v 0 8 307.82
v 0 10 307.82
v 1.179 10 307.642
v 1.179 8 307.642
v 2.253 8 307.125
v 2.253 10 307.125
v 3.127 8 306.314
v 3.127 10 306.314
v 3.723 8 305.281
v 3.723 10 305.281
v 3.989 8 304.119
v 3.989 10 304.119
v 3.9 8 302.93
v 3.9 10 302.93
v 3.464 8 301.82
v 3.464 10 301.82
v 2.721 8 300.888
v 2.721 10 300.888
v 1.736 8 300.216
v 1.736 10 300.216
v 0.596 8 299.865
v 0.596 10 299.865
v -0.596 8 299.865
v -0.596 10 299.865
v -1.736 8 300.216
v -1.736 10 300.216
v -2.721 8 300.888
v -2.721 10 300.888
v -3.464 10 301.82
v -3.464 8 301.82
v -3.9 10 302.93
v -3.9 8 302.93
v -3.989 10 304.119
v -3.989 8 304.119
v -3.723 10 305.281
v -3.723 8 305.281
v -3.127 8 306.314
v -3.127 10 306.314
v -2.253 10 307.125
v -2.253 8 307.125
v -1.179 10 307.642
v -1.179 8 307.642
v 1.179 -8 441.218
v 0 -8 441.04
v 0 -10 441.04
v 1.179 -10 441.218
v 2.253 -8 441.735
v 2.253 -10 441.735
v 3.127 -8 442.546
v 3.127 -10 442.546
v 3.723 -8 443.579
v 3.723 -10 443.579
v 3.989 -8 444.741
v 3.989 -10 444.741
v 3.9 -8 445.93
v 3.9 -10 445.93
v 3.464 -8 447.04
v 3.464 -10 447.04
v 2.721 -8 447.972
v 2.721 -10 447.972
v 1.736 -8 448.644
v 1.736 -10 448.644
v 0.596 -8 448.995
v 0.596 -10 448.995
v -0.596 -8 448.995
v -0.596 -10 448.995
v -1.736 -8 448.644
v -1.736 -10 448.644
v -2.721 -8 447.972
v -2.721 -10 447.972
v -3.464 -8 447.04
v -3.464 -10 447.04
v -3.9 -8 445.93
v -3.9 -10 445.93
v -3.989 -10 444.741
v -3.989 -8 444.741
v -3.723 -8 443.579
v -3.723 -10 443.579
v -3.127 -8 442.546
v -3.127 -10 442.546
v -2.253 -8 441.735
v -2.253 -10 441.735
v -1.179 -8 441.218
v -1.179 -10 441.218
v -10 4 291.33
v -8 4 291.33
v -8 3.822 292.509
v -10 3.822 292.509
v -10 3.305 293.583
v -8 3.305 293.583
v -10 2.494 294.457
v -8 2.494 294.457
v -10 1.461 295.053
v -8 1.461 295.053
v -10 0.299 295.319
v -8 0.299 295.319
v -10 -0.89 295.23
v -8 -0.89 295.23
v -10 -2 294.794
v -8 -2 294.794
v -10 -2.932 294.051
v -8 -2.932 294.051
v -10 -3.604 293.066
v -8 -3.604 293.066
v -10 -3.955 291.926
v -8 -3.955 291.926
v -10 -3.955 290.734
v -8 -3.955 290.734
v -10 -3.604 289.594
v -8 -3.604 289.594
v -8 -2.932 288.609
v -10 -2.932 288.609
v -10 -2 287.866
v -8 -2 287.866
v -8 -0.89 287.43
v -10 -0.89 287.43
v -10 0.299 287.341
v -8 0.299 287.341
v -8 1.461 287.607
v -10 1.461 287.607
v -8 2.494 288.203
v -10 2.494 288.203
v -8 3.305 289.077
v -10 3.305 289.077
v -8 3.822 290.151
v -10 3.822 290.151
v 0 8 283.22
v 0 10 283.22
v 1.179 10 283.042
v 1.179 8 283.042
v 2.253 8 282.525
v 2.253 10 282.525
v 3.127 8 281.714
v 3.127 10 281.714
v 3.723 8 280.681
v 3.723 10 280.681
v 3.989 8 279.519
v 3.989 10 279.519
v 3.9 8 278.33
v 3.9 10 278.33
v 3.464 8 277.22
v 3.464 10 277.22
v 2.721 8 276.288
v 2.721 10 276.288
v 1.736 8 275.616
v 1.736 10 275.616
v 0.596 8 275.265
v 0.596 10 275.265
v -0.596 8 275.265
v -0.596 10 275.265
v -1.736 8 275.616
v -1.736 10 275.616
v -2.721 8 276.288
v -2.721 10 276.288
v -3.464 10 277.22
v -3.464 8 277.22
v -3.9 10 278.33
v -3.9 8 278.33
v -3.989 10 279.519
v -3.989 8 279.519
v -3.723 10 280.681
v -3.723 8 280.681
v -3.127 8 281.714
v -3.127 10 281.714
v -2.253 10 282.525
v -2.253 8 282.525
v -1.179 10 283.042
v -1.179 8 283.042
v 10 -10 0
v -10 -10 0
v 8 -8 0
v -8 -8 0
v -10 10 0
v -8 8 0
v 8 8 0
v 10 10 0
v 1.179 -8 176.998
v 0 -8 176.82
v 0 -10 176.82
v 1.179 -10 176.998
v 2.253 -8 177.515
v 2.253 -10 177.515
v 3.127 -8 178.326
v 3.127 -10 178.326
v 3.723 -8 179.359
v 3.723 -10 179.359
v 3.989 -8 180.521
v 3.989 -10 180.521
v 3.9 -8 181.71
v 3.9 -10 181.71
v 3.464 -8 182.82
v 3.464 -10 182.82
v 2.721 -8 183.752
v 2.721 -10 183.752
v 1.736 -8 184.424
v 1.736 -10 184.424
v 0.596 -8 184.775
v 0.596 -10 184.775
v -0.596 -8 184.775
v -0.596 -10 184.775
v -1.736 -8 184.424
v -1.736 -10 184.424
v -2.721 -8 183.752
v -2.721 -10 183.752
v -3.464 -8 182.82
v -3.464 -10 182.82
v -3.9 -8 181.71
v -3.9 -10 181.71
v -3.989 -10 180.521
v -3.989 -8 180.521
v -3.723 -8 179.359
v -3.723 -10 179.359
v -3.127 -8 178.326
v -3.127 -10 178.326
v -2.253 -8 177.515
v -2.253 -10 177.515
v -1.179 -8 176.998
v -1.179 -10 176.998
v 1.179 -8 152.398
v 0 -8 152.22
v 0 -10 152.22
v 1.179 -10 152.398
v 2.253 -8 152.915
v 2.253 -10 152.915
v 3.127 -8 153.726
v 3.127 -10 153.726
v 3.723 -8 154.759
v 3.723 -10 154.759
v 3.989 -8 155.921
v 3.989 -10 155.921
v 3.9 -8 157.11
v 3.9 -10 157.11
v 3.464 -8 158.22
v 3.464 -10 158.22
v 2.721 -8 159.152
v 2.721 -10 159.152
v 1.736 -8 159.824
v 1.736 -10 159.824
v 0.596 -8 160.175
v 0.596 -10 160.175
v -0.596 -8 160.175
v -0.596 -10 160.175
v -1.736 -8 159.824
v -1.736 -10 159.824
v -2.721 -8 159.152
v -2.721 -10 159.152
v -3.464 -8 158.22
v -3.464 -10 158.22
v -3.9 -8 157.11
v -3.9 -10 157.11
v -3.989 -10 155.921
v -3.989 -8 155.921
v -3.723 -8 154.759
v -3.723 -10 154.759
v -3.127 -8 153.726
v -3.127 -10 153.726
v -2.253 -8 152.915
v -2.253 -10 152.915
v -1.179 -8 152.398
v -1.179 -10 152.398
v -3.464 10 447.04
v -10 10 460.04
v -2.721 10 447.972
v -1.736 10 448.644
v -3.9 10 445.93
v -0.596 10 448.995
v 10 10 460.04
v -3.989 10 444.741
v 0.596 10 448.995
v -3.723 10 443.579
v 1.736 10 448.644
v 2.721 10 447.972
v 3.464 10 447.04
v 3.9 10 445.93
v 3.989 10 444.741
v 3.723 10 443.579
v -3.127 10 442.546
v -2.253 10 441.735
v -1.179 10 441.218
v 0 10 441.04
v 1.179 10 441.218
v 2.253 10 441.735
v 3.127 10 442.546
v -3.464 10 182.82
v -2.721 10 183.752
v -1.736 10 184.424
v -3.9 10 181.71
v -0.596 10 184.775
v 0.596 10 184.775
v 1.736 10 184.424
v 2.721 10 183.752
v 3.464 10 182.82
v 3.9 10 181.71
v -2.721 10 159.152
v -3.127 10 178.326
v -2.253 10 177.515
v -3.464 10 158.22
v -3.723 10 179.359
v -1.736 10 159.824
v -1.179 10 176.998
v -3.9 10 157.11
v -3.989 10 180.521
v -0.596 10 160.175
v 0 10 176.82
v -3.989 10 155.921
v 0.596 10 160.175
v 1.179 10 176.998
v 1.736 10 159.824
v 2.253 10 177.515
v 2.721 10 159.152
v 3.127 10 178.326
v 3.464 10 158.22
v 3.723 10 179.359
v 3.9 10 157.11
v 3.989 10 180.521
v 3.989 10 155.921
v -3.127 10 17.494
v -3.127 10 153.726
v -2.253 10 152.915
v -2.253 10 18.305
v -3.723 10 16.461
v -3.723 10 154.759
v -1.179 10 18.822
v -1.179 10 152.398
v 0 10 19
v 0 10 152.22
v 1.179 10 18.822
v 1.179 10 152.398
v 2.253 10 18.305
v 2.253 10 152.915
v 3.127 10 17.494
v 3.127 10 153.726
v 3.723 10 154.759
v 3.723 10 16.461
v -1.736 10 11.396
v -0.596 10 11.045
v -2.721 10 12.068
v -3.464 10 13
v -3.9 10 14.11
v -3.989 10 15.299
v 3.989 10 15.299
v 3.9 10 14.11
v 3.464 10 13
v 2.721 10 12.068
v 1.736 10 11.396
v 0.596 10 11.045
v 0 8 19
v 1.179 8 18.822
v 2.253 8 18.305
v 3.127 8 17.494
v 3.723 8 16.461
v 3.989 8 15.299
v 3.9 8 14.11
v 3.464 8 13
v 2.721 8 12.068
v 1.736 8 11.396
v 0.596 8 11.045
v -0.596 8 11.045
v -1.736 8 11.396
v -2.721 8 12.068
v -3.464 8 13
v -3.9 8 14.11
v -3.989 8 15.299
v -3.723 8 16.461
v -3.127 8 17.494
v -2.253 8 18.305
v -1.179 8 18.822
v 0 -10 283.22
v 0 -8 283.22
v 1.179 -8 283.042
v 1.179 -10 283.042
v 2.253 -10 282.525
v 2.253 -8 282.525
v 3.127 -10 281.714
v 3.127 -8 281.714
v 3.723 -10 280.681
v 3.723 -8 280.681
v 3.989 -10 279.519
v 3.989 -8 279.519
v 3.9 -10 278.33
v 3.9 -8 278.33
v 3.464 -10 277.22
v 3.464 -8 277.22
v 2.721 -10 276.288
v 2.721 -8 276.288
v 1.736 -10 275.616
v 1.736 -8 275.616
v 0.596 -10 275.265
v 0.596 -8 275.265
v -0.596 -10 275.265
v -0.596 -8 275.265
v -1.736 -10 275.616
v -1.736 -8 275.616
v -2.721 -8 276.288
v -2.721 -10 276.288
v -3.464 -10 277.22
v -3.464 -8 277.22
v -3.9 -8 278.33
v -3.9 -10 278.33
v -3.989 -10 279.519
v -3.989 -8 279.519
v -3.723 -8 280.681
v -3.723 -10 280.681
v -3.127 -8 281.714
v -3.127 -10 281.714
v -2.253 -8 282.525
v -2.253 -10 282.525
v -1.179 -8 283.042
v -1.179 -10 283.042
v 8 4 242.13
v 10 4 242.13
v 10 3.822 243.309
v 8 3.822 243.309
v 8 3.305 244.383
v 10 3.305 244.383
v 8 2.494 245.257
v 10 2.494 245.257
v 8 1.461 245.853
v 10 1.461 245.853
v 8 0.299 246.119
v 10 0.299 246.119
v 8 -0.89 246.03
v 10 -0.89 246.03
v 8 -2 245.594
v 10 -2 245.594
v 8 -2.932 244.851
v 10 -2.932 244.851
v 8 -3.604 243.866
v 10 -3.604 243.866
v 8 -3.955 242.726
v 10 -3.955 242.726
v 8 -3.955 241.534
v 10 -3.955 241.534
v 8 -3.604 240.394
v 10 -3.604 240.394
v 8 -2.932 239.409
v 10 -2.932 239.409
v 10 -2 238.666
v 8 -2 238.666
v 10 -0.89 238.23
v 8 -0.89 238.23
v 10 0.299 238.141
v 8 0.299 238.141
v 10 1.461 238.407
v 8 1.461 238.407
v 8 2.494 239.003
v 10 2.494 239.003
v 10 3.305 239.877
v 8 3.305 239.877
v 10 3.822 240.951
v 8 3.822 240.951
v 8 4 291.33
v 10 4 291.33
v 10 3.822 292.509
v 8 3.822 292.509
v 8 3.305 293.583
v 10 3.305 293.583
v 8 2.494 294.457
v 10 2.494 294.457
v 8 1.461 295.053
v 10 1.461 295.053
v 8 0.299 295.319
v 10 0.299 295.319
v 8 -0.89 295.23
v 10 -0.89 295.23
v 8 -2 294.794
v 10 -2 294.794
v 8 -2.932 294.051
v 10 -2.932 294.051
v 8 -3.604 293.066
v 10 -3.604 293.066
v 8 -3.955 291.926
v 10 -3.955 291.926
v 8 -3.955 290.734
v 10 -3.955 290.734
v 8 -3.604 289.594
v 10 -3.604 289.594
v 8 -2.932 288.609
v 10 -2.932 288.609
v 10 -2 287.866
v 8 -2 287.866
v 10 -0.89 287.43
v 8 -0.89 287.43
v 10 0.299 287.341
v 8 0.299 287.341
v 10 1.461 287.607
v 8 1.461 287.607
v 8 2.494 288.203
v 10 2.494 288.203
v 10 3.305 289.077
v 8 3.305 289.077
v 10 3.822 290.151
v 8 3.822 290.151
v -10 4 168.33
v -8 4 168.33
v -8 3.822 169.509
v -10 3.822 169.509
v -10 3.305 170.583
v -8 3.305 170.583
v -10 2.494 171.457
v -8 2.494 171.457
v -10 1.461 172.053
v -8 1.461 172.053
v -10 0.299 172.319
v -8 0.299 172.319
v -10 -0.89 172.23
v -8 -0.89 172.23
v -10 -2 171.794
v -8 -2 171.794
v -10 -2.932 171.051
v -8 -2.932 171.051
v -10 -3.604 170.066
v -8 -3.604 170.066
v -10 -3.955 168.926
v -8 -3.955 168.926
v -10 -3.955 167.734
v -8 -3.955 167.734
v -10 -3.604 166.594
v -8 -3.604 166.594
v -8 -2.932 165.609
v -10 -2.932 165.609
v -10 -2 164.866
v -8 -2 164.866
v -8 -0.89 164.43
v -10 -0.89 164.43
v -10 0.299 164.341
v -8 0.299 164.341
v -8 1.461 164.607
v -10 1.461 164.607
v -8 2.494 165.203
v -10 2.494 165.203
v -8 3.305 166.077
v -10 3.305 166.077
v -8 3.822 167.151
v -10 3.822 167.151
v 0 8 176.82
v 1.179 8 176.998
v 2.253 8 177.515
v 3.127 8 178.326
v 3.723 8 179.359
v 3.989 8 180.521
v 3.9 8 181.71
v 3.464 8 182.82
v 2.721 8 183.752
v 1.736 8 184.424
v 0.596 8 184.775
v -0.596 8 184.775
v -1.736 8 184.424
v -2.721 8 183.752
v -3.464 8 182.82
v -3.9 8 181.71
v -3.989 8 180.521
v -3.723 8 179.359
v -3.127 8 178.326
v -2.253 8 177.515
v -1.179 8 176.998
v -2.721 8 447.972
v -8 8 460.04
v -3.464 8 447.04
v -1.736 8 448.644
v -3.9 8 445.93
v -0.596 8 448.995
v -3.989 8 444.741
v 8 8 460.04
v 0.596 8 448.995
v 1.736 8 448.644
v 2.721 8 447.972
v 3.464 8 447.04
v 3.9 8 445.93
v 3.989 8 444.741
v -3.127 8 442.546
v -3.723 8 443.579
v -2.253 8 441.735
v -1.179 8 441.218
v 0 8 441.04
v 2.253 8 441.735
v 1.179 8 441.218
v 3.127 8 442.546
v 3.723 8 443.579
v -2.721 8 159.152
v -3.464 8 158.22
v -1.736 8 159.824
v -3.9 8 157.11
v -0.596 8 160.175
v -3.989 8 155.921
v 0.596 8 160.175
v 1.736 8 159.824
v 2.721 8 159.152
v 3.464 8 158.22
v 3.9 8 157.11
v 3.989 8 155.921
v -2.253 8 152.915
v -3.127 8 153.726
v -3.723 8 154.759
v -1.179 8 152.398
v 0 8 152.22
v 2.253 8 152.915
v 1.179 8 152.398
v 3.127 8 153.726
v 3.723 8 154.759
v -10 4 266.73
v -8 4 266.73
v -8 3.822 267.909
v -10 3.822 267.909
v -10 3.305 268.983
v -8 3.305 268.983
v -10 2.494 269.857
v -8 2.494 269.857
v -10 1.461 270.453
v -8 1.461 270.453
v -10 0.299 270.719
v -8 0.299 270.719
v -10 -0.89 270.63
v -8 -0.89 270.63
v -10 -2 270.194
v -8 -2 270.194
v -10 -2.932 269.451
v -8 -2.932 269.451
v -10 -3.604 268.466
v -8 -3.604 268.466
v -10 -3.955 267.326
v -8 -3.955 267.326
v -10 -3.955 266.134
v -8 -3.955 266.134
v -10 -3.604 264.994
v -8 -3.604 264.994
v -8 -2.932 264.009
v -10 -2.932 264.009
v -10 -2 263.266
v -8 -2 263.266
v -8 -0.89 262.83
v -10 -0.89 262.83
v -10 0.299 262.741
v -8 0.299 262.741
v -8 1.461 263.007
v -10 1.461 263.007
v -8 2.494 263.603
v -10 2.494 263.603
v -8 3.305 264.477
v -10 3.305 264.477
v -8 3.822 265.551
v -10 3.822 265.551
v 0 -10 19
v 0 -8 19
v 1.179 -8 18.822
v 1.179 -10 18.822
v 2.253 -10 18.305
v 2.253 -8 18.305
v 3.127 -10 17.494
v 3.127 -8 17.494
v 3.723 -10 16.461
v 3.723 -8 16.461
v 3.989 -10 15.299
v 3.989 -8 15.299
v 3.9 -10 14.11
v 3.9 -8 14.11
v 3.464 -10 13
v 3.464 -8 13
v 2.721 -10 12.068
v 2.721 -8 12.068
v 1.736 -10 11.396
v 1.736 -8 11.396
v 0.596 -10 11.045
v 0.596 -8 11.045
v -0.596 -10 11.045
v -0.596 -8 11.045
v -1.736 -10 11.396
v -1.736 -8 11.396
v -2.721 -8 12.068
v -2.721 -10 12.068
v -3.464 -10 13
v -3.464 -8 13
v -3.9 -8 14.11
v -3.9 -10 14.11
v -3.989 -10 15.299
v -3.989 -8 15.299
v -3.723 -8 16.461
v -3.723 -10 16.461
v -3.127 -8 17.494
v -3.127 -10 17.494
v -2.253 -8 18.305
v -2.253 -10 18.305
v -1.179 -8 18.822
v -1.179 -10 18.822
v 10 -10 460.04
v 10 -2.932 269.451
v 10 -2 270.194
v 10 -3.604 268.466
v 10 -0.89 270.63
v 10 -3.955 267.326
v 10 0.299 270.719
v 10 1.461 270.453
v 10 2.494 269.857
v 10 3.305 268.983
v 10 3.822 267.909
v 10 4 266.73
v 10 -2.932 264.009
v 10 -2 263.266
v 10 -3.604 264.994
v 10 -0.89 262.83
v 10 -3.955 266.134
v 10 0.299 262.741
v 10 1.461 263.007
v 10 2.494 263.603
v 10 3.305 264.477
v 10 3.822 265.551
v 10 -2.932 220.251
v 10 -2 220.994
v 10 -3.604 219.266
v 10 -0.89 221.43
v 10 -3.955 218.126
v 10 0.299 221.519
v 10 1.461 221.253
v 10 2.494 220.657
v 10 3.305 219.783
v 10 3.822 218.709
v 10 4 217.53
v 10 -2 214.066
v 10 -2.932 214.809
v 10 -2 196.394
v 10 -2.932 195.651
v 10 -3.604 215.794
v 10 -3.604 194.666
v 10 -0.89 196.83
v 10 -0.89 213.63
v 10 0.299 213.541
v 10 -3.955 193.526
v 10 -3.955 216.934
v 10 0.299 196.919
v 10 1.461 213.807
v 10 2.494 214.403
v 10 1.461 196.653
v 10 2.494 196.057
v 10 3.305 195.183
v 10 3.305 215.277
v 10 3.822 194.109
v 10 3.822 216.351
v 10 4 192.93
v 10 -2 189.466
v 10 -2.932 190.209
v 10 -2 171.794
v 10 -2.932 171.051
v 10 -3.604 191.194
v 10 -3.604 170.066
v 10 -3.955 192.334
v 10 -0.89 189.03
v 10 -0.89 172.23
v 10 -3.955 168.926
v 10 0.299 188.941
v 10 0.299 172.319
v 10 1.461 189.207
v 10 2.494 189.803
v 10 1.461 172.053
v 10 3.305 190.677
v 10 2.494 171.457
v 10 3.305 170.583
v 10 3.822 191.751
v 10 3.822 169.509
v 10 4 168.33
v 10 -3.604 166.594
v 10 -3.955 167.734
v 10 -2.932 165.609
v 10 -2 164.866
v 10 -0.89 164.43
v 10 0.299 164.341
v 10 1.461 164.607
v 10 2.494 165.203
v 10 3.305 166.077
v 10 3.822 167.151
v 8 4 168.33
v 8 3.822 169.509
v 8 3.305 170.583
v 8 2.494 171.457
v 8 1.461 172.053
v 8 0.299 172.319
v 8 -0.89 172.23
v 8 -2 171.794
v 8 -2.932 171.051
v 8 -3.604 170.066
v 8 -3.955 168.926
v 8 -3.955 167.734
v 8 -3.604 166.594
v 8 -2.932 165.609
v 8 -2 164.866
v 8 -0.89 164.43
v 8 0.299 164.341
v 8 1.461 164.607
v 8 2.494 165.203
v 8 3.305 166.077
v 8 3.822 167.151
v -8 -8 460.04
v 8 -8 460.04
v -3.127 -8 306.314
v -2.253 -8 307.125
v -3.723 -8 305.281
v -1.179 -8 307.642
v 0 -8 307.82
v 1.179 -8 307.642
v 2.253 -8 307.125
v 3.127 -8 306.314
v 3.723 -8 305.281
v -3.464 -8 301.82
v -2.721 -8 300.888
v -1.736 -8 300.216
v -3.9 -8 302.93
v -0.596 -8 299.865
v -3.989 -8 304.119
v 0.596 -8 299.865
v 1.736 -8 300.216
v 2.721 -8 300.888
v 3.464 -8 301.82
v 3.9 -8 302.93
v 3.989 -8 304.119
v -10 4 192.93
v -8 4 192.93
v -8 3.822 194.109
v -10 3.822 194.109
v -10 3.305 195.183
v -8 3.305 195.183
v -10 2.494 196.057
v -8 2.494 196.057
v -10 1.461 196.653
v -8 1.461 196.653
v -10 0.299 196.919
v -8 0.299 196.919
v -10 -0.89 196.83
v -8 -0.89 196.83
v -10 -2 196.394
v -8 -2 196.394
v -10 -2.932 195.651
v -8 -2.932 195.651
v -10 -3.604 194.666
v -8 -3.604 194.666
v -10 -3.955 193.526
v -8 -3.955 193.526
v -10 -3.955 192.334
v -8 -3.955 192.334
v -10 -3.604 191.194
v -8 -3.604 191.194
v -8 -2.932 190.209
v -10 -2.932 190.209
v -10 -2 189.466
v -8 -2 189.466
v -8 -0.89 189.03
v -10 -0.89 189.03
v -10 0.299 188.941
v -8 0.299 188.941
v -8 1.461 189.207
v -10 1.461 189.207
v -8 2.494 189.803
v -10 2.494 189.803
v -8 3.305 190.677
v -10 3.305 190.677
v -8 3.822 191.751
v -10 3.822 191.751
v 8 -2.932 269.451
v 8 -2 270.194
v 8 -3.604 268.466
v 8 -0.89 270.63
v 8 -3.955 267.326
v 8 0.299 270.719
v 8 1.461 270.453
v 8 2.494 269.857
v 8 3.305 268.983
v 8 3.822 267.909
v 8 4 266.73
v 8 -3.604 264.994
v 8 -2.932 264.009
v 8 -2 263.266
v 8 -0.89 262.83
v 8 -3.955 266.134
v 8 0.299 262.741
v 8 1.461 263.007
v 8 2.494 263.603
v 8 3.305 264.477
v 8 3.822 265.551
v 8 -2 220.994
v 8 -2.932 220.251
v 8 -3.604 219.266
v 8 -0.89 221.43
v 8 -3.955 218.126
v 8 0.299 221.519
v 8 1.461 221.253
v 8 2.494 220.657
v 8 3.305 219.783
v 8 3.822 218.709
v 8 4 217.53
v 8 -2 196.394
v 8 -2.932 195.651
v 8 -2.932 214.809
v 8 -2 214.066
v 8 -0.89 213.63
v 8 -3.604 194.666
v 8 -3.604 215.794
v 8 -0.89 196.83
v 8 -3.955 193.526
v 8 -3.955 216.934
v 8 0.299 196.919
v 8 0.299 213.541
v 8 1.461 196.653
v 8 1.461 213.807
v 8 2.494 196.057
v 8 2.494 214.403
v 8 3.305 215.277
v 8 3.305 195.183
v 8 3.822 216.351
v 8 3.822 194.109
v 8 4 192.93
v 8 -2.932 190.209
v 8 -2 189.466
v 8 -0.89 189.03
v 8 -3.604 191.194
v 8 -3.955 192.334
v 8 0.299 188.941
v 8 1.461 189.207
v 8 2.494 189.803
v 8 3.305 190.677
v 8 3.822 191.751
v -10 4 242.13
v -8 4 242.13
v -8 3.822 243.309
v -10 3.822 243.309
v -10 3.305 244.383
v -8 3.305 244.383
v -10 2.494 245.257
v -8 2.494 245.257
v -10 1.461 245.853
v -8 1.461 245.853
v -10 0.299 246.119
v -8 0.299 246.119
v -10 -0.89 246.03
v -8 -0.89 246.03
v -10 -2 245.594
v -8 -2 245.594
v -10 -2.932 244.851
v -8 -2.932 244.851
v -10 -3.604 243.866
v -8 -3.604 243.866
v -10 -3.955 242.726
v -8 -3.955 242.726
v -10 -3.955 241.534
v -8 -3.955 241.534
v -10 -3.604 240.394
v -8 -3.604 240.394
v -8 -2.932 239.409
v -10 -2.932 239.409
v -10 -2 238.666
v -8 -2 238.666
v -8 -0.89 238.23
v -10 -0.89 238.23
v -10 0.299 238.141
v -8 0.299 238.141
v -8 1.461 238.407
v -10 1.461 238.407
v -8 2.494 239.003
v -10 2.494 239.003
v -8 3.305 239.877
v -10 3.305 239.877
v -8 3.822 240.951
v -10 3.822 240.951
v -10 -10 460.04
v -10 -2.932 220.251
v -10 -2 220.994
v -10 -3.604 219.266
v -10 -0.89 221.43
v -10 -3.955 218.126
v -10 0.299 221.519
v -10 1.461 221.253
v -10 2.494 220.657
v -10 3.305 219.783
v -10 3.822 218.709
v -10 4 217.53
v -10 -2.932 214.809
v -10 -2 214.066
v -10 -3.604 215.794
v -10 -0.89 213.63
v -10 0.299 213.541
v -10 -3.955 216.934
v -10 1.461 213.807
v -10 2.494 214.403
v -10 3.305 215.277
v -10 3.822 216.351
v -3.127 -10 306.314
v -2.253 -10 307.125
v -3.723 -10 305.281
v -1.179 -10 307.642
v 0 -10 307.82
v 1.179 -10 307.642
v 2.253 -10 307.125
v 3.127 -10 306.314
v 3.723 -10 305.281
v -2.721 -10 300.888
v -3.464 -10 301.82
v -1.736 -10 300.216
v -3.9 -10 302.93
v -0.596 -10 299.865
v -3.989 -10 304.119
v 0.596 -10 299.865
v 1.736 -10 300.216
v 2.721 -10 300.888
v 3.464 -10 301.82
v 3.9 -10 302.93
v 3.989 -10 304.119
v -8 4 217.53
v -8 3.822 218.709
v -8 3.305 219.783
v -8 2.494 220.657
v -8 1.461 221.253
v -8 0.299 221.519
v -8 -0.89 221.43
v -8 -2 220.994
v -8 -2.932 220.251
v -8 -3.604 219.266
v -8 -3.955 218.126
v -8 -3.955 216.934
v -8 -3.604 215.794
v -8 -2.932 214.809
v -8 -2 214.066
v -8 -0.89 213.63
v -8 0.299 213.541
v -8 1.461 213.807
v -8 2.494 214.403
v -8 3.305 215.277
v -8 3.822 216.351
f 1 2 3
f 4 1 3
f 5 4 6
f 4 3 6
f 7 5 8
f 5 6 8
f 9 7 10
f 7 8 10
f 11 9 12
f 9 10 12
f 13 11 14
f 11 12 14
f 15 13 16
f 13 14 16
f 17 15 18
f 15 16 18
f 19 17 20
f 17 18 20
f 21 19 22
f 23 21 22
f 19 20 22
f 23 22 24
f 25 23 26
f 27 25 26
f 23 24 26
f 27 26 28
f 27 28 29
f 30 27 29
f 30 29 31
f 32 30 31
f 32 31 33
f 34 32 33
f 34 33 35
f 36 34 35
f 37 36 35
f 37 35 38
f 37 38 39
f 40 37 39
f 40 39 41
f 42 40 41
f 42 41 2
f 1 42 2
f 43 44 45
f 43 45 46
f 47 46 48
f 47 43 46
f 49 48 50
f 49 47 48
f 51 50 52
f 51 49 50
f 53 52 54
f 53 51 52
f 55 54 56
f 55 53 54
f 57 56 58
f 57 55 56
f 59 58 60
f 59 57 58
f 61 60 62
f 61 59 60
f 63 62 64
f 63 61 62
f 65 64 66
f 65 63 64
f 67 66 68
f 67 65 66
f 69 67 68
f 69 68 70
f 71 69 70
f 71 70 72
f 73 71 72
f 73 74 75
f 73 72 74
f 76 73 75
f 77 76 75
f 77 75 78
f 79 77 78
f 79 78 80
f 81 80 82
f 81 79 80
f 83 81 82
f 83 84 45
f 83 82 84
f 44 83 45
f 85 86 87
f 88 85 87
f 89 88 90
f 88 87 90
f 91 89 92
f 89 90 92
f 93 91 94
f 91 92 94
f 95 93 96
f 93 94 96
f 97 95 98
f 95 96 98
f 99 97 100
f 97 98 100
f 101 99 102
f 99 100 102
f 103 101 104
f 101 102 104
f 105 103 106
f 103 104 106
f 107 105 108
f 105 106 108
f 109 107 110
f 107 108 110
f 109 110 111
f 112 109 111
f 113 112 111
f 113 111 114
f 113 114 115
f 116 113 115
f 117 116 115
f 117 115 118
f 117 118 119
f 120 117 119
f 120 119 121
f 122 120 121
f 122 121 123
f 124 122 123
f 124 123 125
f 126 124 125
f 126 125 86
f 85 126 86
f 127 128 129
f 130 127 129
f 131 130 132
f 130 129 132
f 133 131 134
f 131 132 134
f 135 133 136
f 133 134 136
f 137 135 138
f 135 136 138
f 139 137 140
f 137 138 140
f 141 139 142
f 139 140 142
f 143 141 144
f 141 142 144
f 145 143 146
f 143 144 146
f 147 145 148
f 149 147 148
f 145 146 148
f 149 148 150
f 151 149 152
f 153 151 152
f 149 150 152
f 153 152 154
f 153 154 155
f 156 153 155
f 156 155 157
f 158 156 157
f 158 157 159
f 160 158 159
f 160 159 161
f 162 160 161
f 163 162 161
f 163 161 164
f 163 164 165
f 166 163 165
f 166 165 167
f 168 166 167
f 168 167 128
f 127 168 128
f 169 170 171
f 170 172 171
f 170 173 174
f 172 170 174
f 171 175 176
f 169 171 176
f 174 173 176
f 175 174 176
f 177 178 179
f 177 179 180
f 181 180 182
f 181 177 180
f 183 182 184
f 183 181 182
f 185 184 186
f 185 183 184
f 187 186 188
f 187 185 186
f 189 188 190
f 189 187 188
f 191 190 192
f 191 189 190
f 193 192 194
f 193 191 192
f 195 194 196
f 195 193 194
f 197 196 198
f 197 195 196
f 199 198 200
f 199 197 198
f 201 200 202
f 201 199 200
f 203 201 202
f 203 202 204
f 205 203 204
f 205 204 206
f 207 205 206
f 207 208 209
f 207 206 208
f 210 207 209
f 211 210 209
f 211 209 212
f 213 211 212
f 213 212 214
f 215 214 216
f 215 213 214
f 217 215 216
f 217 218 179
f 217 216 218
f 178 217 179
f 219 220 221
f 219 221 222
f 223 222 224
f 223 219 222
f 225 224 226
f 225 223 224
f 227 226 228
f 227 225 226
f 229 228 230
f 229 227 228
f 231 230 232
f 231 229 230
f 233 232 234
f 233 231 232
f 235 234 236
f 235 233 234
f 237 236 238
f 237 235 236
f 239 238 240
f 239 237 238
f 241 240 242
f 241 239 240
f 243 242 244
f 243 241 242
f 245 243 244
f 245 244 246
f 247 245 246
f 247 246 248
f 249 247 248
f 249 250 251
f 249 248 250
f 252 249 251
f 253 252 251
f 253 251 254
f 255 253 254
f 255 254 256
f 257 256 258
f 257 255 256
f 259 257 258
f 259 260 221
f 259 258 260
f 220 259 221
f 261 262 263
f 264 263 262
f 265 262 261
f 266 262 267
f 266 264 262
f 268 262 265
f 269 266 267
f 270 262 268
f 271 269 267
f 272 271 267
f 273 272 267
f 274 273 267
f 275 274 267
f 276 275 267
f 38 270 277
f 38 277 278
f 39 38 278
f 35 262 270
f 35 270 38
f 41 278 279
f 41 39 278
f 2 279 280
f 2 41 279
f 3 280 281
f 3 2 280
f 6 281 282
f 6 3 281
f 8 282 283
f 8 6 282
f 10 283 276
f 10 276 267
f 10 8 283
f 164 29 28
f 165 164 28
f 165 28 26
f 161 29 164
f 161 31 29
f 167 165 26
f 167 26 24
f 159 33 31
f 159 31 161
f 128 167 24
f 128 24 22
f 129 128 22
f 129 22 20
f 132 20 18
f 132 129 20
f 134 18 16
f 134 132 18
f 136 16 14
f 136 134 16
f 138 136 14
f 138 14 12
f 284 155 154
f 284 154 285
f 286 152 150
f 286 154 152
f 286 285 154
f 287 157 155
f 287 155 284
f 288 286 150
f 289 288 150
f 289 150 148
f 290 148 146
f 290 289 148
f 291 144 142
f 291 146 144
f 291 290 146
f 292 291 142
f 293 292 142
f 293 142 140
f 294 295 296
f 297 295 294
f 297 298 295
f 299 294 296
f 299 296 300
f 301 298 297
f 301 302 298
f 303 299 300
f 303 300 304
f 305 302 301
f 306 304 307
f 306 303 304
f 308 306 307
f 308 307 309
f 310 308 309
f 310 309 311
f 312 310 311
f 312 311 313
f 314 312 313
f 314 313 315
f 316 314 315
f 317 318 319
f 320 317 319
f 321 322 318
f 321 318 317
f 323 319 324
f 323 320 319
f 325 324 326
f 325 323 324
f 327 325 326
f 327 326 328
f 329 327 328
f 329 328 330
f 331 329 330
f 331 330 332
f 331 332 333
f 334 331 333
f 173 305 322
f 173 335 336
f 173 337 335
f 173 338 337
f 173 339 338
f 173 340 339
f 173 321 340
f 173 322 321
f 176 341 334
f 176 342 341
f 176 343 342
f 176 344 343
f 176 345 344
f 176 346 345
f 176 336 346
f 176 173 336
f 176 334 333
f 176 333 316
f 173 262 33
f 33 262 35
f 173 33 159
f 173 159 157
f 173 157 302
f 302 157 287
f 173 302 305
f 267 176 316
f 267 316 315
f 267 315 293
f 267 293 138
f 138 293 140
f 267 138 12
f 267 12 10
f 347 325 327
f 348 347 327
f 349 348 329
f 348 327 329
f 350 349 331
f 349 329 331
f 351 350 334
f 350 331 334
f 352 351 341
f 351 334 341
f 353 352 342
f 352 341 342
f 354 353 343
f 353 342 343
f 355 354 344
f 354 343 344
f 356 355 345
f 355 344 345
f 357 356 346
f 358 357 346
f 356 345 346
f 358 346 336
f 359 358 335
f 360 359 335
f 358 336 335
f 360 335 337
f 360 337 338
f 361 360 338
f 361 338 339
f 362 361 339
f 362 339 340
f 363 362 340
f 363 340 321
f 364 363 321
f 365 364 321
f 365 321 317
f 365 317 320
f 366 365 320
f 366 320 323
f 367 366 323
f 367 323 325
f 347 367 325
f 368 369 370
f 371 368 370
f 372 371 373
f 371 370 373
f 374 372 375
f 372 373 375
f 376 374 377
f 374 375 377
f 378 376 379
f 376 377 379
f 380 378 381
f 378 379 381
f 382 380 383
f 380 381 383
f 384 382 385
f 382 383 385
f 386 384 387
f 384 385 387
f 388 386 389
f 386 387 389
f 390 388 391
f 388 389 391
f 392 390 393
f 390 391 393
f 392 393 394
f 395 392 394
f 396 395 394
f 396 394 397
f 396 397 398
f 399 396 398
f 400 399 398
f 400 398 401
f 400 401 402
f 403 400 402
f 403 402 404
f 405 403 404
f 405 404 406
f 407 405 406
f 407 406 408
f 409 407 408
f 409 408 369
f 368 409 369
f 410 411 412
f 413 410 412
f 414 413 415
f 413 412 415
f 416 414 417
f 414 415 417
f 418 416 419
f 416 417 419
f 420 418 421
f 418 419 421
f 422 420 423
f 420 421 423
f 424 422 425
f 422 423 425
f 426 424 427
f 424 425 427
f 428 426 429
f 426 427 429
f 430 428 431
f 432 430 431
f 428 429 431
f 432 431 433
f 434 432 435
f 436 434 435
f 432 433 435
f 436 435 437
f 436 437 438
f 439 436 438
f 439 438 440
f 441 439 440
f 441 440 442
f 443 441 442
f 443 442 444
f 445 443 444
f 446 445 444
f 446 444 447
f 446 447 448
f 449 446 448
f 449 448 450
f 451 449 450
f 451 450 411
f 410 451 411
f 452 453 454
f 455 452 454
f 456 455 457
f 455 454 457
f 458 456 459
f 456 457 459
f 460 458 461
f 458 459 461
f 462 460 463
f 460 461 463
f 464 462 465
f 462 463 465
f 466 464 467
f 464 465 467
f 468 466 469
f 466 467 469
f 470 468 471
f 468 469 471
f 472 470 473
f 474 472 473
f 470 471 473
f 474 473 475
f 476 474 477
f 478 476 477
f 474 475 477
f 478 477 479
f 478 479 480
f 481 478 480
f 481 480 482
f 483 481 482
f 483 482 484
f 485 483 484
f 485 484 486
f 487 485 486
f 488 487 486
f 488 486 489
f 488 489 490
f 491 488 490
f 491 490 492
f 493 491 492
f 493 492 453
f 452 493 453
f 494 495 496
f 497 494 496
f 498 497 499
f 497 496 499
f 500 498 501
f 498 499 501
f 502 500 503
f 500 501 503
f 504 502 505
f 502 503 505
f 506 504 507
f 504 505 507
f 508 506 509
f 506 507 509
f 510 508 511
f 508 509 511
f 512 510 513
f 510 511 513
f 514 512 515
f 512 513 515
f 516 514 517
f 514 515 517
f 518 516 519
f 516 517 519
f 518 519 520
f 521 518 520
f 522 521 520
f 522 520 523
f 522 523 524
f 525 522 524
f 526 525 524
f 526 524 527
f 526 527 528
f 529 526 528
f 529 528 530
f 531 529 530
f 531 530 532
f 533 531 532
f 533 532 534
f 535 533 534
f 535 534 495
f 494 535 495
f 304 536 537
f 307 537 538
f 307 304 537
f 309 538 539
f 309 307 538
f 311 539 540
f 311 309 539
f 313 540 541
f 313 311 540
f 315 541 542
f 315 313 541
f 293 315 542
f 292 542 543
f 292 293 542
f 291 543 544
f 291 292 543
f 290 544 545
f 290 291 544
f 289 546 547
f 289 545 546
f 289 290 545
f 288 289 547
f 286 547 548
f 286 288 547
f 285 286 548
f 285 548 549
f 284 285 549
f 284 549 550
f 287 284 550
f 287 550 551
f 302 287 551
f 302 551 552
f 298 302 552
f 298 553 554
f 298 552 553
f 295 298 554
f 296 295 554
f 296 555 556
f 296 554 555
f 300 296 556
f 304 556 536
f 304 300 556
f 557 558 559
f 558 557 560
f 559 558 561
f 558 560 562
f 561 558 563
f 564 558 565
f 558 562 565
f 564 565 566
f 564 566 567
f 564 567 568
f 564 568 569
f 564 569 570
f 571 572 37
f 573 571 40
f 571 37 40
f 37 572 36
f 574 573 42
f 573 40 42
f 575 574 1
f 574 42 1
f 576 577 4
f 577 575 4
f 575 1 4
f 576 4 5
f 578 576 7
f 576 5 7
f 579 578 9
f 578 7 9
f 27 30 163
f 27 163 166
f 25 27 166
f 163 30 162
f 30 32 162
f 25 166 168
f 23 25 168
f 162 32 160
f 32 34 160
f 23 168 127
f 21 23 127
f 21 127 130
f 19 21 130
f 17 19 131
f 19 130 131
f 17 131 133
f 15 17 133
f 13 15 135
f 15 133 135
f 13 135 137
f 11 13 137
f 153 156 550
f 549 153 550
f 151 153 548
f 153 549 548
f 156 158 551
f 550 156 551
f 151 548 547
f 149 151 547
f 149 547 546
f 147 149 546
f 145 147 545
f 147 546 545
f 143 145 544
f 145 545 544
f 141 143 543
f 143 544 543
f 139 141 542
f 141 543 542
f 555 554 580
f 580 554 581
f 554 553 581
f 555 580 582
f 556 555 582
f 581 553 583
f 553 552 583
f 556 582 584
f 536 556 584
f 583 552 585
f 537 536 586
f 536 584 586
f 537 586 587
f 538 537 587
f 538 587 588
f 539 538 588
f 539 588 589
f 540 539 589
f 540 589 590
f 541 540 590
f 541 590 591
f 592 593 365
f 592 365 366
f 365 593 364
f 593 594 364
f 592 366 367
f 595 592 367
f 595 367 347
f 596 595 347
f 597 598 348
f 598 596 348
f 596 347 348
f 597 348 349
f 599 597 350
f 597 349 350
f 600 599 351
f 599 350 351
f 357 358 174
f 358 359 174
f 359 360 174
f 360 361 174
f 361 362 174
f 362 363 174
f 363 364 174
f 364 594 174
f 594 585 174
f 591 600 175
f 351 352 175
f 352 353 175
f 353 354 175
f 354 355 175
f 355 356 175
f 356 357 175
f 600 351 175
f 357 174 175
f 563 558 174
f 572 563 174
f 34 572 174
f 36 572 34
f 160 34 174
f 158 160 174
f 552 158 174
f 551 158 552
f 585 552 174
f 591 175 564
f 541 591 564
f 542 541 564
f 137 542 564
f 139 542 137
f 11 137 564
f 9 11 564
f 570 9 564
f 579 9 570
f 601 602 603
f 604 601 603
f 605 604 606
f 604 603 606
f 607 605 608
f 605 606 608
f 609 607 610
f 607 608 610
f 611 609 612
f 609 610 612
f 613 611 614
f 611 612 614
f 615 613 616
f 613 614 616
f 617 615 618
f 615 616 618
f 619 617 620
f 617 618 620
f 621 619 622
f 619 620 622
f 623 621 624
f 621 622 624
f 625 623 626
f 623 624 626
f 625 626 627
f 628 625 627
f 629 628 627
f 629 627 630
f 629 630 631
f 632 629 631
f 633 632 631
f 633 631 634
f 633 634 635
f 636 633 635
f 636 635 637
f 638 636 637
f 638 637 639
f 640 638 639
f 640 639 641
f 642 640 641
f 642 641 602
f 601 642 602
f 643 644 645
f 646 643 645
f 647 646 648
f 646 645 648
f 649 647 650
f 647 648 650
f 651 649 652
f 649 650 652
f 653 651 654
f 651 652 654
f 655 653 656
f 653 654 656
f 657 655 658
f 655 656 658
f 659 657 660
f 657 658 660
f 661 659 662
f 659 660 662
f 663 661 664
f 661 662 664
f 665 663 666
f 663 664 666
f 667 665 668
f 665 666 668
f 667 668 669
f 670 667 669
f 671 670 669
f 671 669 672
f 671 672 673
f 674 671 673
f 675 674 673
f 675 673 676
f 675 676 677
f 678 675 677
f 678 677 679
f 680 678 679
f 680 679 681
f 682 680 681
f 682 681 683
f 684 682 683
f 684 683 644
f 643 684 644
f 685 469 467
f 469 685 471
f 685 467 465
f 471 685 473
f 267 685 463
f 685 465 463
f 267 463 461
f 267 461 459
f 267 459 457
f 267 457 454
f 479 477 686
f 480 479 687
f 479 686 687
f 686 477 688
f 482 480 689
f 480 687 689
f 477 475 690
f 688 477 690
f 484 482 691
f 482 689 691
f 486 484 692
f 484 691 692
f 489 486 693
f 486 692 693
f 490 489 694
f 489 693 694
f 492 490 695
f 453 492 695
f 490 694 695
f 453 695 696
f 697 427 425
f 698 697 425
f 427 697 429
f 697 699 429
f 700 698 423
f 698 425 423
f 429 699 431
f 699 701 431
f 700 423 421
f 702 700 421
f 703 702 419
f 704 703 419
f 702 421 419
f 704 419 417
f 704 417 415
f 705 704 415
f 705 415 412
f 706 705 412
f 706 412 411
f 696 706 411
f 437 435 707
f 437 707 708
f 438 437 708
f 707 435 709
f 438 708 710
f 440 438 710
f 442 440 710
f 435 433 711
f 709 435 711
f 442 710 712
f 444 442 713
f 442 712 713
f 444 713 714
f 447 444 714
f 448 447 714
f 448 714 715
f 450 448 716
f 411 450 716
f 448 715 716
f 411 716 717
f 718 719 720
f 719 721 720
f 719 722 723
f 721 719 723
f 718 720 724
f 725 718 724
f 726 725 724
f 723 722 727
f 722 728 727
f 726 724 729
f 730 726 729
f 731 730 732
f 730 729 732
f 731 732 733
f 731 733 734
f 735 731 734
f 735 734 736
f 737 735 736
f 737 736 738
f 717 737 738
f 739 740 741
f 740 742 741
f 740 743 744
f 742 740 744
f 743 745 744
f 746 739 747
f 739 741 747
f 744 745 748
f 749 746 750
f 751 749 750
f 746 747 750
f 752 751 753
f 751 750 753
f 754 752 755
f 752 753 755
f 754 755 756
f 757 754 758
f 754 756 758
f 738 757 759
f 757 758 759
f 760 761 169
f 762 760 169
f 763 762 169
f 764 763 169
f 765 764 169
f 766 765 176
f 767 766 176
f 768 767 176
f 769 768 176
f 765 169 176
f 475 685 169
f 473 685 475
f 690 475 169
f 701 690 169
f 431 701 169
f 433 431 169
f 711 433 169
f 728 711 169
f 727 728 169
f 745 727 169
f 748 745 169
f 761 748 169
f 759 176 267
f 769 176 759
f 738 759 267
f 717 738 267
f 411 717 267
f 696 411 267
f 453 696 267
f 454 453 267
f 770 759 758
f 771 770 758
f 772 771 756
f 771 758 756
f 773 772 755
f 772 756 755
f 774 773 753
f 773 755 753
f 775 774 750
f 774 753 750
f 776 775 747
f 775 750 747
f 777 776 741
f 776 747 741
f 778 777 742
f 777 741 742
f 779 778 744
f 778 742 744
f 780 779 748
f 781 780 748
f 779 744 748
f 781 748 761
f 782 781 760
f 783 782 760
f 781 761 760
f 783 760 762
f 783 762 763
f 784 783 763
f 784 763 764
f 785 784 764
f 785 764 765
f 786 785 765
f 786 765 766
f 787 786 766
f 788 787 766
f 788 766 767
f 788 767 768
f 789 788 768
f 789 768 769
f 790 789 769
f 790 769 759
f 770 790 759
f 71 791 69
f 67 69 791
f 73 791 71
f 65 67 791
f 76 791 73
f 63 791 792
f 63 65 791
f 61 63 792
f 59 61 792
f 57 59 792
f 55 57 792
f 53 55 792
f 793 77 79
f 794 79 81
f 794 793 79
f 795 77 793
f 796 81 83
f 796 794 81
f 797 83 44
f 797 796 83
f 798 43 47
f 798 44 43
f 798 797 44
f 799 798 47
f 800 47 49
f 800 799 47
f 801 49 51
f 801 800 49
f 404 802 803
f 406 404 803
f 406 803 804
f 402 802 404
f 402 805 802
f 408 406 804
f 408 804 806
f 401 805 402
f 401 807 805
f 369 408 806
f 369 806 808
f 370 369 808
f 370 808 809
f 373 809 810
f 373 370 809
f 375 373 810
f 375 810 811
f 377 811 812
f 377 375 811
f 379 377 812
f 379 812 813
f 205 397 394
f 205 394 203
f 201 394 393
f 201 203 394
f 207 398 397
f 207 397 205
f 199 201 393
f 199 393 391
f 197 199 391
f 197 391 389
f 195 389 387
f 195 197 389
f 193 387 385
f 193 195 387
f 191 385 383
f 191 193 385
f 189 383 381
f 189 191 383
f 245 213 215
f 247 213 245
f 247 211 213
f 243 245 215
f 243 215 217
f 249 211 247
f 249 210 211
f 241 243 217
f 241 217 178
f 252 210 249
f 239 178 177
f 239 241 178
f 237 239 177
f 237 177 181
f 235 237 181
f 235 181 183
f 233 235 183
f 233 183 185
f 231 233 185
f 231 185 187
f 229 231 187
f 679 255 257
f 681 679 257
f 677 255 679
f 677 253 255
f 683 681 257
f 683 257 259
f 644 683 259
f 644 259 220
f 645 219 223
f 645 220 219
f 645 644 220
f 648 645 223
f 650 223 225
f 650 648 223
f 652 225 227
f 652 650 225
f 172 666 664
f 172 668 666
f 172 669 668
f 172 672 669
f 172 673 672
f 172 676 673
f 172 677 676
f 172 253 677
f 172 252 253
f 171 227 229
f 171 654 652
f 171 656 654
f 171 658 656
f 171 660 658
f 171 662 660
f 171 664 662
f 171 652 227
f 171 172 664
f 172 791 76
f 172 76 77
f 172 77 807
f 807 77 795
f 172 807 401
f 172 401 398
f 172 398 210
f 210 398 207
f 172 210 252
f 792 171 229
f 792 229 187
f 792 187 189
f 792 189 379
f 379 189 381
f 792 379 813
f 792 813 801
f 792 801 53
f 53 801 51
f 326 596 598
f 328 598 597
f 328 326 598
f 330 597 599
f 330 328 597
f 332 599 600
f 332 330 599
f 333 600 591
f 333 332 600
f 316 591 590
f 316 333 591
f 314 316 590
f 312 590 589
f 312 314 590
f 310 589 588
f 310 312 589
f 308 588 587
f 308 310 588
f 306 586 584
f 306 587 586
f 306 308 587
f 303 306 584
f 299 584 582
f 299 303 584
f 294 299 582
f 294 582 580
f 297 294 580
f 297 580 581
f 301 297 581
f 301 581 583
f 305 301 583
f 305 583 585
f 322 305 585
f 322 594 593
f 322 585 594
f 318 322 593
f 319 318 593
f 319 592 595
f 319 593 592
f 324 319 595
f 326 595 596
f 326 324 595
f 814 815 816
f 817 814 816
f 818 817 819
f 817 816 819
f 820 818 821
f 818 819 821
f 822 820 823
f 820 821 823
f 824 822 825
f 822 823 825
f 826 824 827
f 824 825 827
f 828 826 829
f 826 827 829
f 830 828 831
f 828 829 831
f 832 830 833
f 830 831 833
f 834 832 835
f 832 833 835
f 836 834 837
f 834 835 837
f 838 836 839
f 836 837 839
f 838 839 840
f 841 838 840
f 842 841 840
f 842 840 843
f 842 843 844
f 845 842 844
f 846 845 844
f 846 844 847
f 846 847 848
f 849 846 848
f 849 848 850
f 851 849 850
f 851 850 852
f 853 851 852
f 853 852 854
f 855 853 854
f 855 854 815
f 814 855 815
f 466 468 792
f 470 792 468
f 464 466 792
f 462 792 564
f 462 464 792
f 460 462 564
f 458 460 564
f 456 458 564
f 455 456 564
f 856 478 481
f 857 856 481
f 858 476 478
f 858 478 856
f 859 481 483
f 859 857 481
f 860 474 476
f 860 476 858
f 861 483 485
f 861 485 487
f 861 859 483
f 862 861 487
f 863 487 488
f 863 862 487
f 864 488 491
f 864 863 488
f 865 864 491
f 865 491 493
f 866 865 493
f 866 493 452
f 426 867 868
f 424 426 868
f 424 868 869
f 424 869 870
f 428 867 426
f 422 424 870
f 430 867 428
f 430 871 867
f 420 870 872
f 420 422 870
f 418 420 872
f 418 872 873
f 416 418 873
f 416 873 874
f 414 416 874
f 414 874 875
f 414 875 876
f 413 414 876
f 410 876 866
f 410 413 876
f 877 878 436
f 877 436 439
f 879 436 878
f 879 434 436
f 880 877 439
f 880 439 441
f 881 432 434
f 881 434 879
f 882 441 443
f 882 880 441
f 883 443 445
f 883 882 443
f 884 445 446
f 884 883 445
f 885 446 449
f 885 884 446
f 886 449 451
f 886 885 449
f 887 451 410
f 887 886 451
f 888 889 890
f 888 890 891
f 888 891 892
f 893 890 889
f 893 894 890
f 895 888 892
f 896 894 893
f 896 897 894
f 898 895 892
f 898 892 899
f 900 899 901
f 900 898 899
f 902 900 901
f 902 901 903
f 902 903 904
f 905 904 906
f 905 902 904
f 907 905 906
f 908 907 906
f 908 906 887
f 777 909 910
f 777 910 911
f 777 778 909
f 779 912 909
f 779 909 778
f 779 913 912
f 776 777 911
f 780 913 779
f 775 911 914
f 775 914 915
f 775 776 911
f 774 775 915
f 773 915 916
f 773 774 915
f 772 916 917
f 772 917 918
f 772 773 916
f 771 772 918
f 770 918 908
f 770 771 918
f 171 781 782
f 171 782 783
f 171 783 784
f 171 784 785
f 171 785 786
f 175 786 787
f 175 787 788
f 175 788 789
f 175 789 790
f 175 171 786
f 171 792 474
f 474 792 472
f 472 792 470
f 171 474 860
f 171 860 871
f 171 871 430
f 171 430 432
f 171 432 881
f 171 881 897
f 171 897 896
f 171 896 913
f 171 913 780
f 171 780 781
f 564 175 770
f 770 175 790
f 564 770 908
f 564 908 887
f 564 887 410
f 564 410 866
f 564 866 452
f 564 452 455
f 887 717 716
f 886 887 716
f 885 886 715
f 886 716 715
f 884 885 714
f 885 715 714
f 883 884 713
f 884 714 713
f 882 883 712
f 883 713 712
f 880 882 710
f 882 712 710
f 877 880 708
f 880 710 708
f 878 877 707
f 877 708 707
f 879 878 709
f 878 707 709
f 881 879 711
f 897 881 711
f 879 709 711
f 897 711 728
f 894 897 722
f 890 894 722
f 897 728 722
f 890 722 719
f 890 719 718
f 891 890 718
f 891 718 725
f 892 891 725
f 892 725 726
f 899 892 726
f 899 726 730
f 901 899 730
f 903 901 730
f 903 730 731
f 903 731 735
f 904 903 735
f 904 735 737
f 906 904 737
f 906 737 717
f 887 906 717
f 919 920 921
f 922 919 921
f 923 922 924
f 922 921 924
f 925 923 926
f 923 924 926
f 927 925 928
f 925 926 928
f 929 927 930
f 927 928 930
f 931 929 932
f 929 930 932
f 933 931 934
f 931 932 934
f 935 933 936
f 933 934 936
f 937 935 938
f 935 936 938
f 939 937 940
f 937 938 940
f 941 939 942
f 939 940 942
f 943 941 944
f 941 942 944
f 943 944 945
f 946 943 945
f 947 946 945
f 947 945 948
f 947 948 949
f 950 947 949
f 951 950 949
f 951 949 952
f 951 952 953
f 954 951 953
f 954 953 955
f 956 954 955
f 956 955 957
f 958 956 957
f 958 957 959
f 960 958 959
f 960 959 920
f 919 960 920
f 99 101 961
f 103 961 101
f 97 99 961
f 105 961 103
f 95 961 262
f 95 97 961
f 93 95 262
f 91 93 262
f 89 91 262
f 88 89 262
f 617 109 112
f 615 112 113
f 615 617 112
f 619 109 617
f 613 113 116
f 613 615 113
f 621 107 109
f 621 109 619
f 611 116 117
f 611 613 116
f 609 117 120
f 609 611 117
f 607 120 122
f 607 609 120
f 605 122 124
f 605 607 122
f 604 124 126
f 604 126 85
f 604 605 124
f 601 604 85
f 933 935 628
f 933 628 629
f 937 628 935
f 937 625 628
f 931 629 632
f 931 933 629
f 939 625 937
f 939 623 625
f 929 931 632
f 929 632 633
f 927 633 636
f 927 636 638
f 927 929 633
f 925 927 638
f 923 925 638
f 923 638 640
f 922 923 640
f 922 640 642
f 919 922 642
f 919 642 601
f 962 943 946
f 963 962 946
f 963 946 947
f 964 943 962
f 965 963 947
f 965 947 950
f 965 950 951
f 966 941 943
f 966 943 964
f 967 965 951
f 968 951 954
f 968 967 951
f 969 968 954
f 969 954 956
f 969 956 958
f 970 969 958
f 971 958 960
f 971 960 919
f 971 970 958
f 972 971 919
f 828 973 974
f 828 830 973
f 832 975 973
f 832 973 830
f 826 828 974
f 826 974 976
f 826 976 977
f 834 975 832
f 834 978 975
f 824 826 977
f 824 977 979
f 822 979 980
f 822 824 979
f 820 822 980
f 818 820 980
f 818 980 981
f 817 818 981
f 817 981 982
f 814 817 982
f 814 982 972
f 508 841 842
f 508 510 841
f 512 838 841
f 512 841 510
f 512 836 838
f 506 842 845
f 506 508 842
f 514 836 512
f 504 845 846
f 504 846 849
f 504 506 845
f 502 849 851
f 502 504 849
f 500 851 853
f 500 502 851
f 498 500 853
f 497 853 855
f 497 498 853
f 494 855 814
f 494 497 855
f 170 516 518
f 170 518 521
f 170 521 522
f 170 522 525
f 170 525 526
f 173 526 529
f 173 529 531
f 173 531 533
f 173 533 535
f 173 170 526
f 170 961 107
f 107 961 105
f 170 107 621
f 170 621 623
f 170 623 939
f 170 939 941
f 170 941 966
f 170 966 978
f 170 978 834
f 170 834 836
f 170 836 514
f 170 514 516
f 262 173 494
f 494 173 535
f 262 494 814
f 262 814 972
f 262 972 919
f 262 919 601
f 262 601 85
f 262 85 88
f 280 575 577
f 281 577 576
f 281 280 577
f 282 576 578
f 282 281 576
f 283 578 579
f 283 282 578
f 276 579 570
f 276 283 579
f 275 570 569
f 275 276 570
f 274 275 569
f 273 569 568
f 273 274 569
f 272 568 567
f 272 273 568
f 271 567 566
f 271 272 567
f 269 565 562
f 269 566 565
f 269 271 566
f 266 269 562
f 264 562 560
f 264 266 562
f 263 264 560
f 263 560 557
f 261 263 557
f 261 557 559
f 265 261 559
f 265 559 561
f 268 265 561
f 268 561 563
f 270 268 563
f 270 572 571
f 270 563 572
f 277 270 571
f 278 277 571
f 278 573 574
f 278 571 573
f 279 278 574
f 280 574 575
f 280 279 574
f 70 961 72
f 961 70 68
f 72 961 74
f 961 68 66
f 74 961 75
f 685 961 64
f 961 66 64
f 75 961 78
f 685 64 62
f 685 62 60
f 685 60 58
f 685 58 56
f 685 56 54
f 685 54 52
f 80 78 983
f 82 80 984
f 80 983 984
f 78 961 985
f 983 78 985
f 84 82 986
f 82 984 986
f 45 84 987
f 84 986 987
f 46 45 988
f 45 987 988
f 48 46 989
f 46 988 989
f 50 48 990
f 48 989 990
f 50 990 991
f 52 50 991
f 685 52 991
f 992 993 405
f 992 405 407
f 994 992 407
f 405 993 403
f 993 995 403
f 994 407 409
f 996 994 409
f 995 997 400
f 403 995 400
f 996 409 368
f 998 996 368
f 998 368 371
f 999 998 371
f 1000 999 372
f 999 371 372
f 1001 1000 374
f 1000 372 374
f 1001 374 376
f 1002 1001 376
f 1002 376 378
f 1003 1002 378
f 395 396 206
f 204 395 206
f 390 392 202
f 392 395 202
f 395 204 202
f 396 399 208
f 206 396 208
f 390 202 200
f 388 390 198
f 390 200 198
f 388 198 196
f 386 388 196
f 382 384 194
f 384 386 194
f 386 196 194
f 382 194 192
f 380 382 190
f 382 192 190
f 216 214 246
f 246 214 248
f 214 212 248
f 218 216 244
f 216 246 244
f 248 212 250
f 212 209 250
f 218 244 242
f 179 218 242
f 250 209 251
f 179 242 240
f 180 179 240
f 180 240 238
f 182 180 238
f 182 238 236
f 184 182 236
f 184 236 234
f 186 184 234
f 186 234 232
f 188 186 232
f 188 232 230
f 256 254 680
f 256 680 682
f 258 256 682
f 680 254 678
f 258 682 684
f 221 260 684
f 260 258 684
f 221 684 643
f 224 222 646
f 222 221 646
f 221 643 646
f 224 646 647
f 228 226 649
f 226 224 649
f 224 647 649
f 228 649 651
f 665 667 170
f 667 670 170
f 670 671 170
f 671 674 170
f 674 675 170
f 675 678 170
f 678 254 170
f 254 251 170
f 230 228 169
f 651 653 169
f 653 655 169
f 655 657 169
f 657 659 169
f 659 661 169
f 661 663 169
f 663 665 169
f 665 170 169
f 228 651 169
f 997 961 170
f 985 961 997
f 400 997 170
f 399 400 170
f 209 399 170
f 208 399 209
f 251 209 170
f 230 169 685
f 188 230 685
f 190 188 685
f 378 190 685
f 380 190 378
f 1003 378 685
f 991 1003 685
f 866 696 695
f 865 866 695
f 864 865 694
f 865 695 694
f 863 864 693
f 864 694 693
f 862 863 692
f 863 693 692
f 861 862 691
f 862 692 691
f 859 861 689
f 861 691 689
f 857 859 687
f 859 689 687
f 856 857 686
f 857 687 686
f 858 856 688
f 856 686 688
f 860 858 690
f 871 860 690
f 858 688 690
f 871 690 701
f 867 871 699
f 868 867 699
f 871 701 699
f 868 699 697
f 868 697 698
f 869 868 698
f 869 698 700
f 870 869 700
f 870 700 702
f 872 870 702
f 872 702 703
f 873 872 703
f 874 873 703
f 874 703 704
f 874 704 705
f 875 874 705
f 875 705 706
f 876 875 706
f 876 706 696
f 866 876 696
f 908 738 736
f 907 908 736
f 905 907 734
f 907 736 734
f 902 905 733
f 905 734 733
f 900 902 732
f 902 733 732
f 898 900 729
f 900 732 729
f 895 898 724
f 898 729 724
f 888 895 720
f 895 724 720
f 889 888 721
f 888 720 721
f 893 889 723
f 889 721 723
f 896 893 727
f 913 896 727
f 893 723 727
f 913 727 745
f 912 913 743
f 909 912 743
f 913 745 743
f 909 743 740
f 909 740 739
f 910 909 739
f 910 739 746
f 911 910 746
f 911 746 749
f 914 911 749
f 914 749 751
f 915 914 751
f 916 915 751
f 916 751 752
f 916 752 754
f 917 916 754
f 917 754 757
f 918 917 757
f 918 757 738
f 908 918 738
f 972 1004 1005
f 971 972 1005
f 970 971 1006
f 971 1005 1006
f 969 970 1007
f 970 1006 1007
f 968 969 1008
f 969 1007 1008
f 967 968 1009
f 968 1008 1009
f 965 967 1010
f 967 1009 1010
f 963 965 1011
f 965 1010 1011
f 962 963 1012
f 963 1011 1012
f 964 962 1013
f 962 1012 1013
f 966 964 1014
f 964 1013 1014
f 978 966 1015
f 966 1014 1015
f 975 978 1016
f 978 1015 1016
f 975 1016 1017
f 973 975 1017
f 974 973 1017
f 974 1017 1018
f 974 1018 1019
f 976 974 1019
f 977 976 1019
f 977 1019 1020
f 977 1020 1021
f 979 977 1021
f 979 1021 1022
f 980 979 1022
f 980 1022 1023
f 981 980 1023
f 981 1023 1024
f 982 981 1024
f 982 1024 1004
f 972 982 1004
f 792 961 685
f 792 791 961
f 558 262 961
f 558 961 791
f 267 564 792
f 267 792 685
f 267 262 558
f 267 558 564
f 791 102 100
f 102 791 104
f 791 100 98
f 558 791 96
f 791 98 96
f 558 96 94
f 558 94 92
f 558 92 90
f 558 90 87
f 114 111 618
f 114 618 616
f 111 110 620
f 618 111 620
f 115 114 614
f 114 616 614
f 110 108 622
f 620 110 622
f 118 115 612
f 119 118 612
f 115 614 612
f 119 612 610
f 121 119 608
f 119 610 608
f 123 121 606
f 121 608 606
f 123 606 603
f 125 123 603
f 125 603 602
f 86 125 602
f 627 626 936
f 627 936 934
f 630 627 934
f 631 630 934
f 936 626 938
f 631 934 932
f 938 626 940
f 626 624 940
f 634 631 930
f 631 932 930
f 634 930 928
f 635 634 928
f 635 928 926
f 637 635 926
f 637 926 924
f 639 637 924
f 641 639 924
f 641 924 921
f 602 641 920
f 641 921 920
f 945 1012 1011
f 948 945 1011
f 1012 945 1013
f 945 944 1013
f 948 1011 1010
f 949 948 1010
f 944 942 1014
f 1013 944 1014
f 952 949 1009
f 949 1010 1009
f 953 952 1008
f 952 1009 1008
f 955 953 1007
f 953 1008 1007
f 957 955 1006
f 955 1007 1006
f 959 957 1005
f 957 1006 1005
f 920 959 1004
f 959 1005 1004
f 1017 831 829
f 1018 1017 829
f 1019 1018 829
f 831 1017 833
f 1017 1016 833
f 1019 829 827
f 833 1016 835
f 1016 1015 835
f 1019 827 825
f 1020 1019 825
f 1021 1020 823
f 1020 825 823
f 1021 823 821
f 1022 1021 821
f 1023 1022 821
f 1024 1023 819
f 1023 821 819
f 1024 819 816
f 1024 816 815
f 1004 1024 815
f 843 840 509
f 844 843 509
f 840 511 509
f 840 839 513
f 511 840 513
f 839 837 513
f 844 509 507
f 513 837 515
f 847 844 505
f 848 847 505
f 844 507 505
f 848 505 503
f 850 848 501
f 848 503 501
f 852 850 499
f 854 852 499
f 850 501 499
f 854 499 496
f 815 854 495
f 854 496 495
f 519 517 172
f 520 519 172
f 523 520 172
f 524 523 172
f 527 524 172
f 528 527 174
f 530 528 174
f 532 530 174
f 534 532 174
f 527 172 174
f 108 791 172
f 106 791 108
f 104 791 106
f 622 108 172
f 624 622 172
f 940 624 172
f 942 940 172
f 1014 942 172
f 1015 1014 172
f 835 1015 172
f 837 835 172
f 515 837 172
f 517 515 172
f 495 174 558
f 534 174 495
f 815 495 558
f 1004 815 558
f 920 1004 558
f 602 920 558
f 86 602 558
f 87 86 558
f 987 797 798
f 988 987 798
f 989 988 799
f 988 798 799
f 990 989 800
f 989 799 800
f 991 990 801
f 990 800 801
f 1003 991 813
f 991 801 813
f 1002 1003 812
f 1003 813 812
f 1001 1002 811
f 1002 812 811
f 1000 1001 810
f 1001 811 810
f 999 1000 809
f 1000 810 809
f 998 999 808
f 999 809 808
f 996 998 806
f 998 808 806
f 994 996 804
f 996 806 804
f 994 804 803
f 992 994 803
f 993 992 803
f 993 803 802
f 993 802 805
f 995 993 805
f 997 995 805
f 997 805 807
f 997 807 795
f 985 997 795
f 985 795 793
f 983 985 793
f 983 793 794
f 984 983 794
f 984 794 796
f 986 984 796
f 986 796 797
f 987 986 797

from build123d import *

# Parameters (mm, degrees)
SKETCH1_W           = 20
SKETCH1_H           = 20
SKETCH1_W_2         = 16
SKETCH1_H_2         = 16
BOSS_EXTRUDE1_DEPTH = 460.04
SKETCH2_R           = 4
CUT_EXTRUDE1_DEPTH  = 461.583110415
SKETCH5_R           = 4
CUT_EXTRUDE2_DEPTH  = 461.583110415
LPATTERN1_COUNT     = 6
LPATTERN1_PITCH     = 24.6
SKETCH6_R           = 4
CUT_EXTRUDE3_DEPTH  = 461.583110415


with BuildPart() as part:
    # Sketch1 → Boss-Extrude1 (new body)
    with BuildSketch(Plane.XY):
        Rectangle(SKETCH1_W, SKETCH1_H)
        Rectangle(SKETCH1_W_2, SKETCH1_H_2, mode=Mode.SUBTRACT)
    extrude(amount=BOSS_EXTRUDE1_DEPTH)

    # Sketch2 → Cut-Extrude1 (cut, through all)
    with BuildSketch(Plane(origin=(0, 10, 0), x_dir=(1, 0, 0), z_dir=(0, 1, 0))):
        with Locations(Location((0, -15, 0), (0, 0, 270))):
            Circle(SKETCH2_R)
    cut_extrude1 = extrude(amount=-CUT_EXTRUDE1_DEPTH, mode=Mode.SUBTRACT)

    # Mirror1: Cut-Extrude1 across plane
    add(cut_extrude1.mirror(Plane.XY.offset(230.02)), mode=Mode.SUBTRACT)

    # Sketch5 → Cut-Extrude2 (cut, through all)
    with BuildSketch(Plane(origin=(10, 0, 0), x_dir=(0, 0, -1), z_dir=(1, 0, 0))):
        with Locations(Location((-291.33, 0, 0), (0, 0, 90))):
            Circle(SKETCH5_R)
    cut_extrude2 = extrude(amount=-CUT_EXTRUDE2_DEPTH, mode=Mode.SUBTRACT)

    # LPattern1: Cut-Extrude2 ×6
    with Locations(*[(0, 0, -i * LPATTERN1_PITCH) for i in range(1, LPATTERN1_COUNT)]):
        add(cut_extrude2, mode=Mode.SUBTRACT)

    # Sketch6 → Cut-Extrude3 (cut, through all)
    with BuildSketch(Plane(origin=(0, 10, 0), x_dir=(1, 0, 0), z_dir=(0, 1, 0))):
        with Locations(Location((0, -303.82, 0), (0, 0, 270))):
            Circle(SKETCH6_R)
        with Locations(Location((0, -279.22, 0), (0, 0, 270))):
            Circle(SKETCH6_R)
    cut_extrude3 = extrude(amount=-CUT_EXTRUDE3_DEPTH, mode=Mode.SUBTRACT)

    # Mirror2: Cut-Extrude3 across plane
    add(cut_extrude3.mirror(Plane.XY.offset(230.02)), mode=Mode.SUBTRACT)


solid = part.part
